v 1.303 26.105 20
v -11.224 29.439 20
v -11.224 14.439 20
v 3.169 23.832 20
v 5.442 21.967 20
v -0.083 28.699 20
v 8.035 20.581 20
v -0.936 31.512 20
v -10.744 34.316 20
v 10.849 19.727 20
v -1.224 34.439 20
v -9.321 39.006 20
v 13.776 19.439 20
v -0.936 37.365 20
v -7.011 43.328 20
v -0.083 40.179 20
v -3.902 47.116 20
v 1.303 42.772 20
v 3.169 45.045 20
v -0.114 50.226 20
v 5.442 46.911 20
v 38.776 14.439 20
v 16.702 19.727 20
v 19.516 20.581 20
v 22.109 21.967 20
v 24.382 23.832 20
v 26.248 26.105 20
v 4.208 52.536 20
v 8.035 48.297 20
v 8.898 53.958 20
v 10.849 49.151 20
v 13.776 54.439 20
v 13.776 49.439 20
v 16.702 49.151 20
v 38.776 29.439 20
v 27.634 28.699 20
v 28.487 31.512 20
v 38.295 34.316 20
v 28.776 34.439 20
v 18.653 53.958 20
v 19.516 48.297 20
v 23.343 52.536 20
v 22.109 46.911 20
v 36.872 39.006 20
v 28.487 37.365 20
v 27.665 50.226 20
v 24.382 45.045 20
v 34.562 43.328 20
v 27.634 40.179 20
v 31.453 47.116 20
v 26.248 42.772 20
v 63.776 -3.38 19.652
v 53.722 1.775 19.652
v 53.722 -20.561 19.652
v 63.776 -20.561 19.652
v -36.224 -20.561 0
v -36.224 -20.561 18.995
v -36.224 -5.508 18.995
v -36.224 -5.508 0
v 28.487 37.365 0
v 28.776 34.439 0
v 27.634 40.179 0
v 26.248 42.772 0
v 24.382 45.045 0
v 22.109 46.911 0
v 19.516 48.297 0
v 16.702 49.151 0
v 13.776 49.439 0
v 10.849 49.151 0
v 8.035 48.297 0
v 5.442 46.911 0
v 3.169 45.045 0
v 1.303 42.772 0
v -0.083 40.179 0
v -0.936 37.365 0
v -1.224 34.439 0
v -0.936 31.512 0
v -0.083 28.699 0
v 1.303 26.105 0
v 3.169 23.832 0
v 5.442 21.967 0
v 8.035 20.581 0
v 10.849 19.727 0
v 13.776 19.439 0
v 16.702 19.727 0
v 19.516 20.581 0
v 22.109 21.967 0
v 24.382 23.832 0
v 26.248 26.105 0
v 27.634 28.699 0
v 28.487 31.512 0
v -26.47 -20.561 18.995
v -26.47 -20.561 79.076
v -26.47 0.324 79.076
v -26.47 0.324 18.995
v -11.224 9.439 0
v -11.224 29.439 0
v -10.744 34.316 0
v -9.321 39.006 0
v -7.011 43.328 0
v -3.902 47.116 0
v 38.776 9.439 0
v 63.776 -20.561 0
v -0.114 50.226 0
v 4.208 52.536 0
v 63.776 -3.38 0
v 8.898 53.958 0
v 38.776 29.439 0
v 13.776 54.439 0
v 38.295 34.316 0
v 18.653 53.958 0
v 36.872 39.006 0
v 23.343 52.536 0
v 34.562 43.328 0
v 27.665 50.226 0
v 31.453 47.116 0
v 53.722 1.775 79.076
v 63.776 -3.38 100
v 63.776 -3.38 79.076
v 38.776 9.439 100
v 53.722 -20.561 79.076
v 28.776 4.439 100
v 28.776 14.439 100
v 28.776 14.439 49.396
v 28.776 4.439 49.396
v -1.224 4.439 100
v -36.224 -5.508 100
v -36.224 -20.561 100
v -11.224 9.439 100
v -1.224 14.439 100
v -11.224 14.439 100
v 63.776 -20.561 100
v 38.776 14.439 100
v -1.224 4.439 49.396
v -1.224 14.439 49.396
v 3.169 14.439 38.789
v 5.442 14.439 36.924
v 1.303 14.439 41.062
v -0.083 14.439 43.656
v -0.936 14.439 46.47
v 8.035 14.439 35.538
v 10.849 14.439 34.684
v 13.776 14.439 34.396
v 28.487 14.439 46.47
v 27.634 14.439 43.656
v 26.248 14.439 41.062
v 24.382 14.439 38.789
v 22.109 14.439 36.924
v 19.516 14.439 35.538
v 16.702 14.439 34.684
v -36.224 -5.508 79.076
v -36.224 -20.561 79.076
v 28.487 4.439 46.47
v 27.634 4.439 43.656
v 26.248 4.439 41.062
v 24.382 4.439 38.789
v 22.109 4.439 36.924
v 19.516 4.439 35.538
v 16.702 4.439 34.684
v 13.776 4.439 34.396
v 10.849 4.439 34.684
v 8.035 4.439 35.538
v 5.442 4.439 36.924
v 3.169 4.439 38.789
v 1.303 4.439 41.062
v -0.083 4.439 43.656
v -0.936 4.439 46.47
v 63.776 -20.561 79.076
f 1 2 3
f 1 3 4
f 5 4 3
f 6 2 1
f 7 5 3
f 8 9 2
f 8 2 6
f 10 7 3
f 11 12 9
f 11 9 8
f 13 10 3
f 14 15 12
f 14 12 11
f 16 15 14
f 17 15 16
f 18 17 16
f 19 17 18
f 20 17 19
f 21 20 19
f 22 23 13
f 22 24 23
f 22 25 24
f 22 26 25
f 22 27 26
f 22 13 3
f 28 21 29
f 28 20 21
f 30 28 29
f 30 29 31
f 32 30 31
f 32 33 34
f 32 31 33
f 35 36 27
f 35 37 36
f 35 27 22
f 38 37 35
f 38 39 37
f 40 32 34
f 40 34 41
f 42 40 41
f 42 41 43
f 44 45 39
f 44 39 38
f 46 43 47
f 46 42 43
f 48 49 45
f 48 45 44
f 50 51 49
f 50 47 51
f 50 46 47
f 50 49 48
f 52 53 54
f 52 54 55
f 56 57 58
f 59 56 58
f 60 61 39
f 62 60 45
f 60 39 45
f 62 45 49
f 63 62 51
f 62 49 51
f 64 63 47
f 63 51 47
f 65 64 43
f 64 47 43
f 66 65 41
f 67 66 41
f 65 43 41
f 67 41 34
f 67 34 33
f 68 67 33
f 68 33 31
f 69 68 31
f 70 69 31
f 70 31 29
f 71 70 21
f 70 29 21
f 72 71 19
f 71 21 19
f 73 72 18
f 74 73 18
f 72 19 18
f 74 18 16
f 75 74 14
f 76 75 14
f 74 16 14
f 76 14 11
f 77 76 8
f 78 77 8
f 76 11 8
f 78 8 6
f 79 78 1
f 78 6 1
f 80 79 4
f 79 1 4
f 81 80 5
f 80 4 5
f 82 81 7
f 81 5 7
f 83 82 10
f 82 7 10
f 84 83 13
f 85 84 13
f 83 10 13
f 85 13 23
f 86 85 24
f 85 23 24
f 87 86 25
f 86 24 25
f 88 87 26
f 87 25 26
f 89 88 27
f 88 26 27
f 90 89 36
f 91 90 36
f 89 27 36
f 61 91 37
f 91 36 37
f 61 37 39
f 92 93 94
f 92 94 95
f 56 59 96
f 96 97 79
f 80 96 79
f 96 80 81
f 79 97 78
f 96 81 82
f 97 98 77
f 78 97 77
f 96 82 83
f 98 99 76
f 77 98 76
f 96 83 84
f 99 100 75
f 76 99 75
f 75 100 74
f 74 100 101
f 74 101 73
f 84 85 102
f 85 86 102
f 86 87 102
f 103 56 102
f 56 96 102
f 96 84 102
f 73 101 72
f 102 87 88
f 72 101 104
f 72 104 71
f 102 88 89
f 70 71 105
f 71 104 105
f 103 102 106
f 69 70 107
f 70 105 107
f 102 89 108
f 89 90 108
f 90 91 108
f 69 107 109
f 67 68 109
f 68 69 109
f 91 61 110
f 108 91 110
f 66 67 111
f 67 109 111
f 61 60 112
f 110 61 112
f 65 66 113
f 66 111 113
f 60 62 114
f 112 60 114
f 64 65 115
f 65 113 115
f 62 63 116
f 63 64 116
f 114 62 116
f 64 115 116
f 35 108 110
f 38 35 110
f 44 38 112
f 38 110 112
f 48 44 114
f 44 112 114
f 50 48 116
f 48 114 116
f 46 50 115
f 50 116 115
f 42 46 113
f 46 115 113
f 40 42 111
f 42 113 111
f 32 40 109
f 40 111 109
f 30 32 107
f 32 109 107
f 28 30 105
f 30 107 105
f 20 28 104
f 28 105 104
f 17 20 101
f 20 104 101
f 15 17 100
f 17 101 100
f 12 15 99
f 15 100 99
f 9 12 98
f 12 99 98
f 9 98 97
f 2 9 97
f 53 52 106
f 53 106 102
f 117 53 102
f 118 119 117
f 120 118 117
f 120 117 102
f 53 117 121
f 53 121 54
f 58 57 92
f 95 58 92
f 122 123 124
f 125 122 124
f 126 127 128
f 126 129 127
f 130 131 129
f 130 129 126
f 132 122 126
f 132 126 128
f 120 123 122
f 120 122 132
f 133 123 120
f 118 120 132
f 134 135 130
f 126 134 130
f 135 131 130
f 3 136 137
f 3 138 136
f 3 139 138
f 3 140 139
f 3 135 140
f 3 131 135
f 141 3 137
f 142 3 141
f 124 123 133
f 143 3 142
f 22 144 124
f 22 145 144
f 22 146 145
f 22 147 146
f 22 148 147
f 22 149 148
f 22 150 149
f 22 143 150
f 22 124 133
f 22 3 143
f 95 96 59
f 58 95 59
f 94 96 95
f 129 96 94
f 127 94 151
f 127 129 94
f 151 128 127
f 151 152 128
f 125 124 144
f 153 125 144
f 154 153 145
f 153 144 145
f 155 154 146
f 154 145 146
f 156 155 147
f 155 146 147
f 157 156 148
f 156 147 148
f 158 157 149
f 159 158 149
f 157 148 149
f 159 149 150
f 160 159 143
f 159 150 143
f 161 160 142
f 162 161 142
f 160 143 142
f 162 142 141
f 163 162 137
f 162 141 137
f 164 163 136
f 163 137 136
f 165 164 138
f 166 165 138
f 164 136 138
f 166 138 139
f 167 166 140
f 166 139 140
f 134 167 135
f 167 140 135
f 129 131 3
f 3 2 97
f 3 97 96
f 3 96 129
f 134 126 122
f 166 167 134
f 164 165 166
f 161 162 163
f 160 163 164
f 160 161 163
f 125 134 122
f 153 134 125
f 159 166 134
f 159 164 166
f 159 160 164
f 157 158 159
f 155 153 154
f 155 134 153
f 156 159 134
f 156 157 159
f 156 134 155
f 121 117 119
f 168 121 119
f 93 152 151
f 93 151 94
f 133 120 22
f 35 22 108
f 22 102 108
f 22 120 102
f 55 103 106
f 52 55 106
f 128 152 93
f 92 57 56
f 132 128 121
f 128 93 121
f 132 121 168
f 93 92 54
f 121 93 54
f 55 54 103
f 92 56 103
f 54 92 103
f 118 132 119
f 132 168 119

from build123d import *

# Parameters (mm, degrees)
SKETCH1_W               = 100
SKETCH1_H               = 30
BOSS_EXTRUDE1_DEPTH     = 100
SKETCH2_W               = 50
SKETCH2_H               = 5
BOSS_EXTRUDE2_DEPTH     = 100
BOSS_EXTRUDE3_DEPTH     = 20
SKETCH4_R               = 15
CUT_EXTRUDE2_DEPTH      = 20
SKETCH5_W               = 9.754337327
SKETCH5_H               = 60.08086333
CUT_EXTRUDE3_DEPTH      = 55.43877551
CUT_EXTRUDE3_DEPTH_BACK = 21.56122449
SKETCH6_W               = 10.053487374
SKETCH6_H               = 59.424714791
CUT_EXTRUDE4_DEPTH      = 46
CUT_EXTRUDE4_DEPTH_BACK = 31
CUT_EXTRUDE5_DEPTH      = 10
CUT_EXTRUDE9_DEPTH      = 130
CUT_EXTRUDE11_DEPTH     = 130


with BuildPart() as part:
    # Sketch1 → Boss-Extrude1 (new body)
    with BuildSketch(Plane.XY):
        with Locations((13.775510204, -5.56122449)):
            Rectangle(SKETCH1_W, SKETCH1_H)
    extrude(amount=BOSS_EXTRUDE1_DEPTH)

    # Sketch2 → Boss-Extrude2 (add)
    with BuildSketch(Plane.XY):
        with Locations((13.775510204, 11.93877551)):
            Rectangle(SKETCH2_W, SKETCH2_H)
    extrude(amount=BOSS_EXTRUDE2_DEPTH)

    # Sketch3 → Boss-Extrude3 (add)
    with BuildSketch(Plane.XY):
        with BuildLine():
            Line((-11.224489796, 14.43877551), (38.775510204, 14.43877551))
            Line((38.775510204, 14.43877551), (38.775510204, 29.43877551))
            ThreePointArc((38.775510204, 29.43877551), (13.775510204, 54.43877551), (-11.224489796, 29.43877551))
            Line((-11.224489796, 29.43877551), (-11.224489796, 14.43877551))
        make_face()
    extrude(amount=BOSS_EXTRUDE3_DEPTH)

    # Sketch4 → Cut-Extrude2 (cut)
    with BuildSketch(Plane.XY.offset(20)):
        with Locations((13.775510204, 34.43877551)):
            Circle(SKETCH4_R)
    extrude(amount=-CUT_EXTRUDE2_DEPTH, mode=Mode.SUBTRACT)

    # Sketch5 → Cut-Extrude3 (cut, two sides)
    with BuildSketch(Plane(origin=(0, 0, 0), x_dir=(1, 0, 0), z_dir=(0, 1, 0))) as cut_extrude3_sk:
        with Locations((-31.347321132, -49.035804096)):
            Rectangle(SKETCH5_W, SKETCH5_H)
    extrude(amount=CUT_EXTRUDE3_DEPTH, mode=Mode.SUBTRACT)
    extrude(cut_extrude3_sk.sketch, amount=-CUT_EXTRUDE3_DEPTH_BACK, mode=Mode.SUBTRACT)

    # Sketch6 → Cut-Extrude4 (cut, two sides)
    with BuildSketch(Plane(origin=(0, 9.43877551, 0), x_dir=(1, 0, 0), z_dir=(0, 1, 0))) as cut_extrude4_sk:
        with Locations((58.748766517, -49.363878365)):
            Rectangle(SKETCH6_W, SKETCH6_H)
    extrude(amount=CUT_EXTRUDE4_DEPTH, mode=Mode.SUBTRACT)
    extrude(cut_extrude4_sk.sketch, amount=-CUT_EXTRUDE4_DEPTH_BACK, mode=Mode.SUBTRACT)

    # Sketch7 → Cut-Extrude5 (cut)
    with BuildSketch(Plane(origin=(0, 14.43877551, 0), x_dir=(1, 0, 0), z_dir=(0, 1, 0))):
        with BuildLine():
            Line((-1.224489796, -90), (-1.224489796, -100))
            Line((-1.224489796, -100), (28.775510204, -100))
            Line((28.775510204, -100), (28.775510204, -90))
            Line((28.775510204, -90), (28.775510204, -49.395873988))
            ThreePointArc((28.775510204, -49.395873988), (13.775510204, -34.395873988), (-1.224489796, -49.395873988))
            Line((-1.224489796, -49.395873988), (-1.224489796, -90))
        make_face()
    extrude(amount=-CUT_EXTRUDE5_DEPTH, mode=Mode.SUBTRACT)

    # Sketch8 → Cut-Extrude9 (cut)
    with BuildSketch(Plane.XY.offset(100)):
        Polygon((63.775510204, 3.25154294), (63.775510204, 9.43877551), (51.275510204, 9.43877551), align=None)
        Polygon((-36.224489796, 9.43877551), (-23.724489796, 9.43877551), (-36.224489796, 3.25154294), align=None)
    extrude(amount=-CUT_EXTRUDE9_DEPTH, mode=Mode.SUBTRACT)

    # Sketch9 → Cut-Extrude11 (cut)
    with BuildSketch(Plane.XY.offset(100)):
        Polygon((-11.224489796, 9.43877551), (-36.224489796, -5.508285905), (-36.224489796, 9.273925271), (-21.818059328, 14.371872445), align=None)
        Polygon((38.775510204, 9.43877551), (67.925947804, 9.43877551), (67.925947804, -5.508285905), align=None)
    extrude(amount=-CUT_EXTRUDE11_DEPTH, mode=Mode.SUBTRACT)


solid = part.part
